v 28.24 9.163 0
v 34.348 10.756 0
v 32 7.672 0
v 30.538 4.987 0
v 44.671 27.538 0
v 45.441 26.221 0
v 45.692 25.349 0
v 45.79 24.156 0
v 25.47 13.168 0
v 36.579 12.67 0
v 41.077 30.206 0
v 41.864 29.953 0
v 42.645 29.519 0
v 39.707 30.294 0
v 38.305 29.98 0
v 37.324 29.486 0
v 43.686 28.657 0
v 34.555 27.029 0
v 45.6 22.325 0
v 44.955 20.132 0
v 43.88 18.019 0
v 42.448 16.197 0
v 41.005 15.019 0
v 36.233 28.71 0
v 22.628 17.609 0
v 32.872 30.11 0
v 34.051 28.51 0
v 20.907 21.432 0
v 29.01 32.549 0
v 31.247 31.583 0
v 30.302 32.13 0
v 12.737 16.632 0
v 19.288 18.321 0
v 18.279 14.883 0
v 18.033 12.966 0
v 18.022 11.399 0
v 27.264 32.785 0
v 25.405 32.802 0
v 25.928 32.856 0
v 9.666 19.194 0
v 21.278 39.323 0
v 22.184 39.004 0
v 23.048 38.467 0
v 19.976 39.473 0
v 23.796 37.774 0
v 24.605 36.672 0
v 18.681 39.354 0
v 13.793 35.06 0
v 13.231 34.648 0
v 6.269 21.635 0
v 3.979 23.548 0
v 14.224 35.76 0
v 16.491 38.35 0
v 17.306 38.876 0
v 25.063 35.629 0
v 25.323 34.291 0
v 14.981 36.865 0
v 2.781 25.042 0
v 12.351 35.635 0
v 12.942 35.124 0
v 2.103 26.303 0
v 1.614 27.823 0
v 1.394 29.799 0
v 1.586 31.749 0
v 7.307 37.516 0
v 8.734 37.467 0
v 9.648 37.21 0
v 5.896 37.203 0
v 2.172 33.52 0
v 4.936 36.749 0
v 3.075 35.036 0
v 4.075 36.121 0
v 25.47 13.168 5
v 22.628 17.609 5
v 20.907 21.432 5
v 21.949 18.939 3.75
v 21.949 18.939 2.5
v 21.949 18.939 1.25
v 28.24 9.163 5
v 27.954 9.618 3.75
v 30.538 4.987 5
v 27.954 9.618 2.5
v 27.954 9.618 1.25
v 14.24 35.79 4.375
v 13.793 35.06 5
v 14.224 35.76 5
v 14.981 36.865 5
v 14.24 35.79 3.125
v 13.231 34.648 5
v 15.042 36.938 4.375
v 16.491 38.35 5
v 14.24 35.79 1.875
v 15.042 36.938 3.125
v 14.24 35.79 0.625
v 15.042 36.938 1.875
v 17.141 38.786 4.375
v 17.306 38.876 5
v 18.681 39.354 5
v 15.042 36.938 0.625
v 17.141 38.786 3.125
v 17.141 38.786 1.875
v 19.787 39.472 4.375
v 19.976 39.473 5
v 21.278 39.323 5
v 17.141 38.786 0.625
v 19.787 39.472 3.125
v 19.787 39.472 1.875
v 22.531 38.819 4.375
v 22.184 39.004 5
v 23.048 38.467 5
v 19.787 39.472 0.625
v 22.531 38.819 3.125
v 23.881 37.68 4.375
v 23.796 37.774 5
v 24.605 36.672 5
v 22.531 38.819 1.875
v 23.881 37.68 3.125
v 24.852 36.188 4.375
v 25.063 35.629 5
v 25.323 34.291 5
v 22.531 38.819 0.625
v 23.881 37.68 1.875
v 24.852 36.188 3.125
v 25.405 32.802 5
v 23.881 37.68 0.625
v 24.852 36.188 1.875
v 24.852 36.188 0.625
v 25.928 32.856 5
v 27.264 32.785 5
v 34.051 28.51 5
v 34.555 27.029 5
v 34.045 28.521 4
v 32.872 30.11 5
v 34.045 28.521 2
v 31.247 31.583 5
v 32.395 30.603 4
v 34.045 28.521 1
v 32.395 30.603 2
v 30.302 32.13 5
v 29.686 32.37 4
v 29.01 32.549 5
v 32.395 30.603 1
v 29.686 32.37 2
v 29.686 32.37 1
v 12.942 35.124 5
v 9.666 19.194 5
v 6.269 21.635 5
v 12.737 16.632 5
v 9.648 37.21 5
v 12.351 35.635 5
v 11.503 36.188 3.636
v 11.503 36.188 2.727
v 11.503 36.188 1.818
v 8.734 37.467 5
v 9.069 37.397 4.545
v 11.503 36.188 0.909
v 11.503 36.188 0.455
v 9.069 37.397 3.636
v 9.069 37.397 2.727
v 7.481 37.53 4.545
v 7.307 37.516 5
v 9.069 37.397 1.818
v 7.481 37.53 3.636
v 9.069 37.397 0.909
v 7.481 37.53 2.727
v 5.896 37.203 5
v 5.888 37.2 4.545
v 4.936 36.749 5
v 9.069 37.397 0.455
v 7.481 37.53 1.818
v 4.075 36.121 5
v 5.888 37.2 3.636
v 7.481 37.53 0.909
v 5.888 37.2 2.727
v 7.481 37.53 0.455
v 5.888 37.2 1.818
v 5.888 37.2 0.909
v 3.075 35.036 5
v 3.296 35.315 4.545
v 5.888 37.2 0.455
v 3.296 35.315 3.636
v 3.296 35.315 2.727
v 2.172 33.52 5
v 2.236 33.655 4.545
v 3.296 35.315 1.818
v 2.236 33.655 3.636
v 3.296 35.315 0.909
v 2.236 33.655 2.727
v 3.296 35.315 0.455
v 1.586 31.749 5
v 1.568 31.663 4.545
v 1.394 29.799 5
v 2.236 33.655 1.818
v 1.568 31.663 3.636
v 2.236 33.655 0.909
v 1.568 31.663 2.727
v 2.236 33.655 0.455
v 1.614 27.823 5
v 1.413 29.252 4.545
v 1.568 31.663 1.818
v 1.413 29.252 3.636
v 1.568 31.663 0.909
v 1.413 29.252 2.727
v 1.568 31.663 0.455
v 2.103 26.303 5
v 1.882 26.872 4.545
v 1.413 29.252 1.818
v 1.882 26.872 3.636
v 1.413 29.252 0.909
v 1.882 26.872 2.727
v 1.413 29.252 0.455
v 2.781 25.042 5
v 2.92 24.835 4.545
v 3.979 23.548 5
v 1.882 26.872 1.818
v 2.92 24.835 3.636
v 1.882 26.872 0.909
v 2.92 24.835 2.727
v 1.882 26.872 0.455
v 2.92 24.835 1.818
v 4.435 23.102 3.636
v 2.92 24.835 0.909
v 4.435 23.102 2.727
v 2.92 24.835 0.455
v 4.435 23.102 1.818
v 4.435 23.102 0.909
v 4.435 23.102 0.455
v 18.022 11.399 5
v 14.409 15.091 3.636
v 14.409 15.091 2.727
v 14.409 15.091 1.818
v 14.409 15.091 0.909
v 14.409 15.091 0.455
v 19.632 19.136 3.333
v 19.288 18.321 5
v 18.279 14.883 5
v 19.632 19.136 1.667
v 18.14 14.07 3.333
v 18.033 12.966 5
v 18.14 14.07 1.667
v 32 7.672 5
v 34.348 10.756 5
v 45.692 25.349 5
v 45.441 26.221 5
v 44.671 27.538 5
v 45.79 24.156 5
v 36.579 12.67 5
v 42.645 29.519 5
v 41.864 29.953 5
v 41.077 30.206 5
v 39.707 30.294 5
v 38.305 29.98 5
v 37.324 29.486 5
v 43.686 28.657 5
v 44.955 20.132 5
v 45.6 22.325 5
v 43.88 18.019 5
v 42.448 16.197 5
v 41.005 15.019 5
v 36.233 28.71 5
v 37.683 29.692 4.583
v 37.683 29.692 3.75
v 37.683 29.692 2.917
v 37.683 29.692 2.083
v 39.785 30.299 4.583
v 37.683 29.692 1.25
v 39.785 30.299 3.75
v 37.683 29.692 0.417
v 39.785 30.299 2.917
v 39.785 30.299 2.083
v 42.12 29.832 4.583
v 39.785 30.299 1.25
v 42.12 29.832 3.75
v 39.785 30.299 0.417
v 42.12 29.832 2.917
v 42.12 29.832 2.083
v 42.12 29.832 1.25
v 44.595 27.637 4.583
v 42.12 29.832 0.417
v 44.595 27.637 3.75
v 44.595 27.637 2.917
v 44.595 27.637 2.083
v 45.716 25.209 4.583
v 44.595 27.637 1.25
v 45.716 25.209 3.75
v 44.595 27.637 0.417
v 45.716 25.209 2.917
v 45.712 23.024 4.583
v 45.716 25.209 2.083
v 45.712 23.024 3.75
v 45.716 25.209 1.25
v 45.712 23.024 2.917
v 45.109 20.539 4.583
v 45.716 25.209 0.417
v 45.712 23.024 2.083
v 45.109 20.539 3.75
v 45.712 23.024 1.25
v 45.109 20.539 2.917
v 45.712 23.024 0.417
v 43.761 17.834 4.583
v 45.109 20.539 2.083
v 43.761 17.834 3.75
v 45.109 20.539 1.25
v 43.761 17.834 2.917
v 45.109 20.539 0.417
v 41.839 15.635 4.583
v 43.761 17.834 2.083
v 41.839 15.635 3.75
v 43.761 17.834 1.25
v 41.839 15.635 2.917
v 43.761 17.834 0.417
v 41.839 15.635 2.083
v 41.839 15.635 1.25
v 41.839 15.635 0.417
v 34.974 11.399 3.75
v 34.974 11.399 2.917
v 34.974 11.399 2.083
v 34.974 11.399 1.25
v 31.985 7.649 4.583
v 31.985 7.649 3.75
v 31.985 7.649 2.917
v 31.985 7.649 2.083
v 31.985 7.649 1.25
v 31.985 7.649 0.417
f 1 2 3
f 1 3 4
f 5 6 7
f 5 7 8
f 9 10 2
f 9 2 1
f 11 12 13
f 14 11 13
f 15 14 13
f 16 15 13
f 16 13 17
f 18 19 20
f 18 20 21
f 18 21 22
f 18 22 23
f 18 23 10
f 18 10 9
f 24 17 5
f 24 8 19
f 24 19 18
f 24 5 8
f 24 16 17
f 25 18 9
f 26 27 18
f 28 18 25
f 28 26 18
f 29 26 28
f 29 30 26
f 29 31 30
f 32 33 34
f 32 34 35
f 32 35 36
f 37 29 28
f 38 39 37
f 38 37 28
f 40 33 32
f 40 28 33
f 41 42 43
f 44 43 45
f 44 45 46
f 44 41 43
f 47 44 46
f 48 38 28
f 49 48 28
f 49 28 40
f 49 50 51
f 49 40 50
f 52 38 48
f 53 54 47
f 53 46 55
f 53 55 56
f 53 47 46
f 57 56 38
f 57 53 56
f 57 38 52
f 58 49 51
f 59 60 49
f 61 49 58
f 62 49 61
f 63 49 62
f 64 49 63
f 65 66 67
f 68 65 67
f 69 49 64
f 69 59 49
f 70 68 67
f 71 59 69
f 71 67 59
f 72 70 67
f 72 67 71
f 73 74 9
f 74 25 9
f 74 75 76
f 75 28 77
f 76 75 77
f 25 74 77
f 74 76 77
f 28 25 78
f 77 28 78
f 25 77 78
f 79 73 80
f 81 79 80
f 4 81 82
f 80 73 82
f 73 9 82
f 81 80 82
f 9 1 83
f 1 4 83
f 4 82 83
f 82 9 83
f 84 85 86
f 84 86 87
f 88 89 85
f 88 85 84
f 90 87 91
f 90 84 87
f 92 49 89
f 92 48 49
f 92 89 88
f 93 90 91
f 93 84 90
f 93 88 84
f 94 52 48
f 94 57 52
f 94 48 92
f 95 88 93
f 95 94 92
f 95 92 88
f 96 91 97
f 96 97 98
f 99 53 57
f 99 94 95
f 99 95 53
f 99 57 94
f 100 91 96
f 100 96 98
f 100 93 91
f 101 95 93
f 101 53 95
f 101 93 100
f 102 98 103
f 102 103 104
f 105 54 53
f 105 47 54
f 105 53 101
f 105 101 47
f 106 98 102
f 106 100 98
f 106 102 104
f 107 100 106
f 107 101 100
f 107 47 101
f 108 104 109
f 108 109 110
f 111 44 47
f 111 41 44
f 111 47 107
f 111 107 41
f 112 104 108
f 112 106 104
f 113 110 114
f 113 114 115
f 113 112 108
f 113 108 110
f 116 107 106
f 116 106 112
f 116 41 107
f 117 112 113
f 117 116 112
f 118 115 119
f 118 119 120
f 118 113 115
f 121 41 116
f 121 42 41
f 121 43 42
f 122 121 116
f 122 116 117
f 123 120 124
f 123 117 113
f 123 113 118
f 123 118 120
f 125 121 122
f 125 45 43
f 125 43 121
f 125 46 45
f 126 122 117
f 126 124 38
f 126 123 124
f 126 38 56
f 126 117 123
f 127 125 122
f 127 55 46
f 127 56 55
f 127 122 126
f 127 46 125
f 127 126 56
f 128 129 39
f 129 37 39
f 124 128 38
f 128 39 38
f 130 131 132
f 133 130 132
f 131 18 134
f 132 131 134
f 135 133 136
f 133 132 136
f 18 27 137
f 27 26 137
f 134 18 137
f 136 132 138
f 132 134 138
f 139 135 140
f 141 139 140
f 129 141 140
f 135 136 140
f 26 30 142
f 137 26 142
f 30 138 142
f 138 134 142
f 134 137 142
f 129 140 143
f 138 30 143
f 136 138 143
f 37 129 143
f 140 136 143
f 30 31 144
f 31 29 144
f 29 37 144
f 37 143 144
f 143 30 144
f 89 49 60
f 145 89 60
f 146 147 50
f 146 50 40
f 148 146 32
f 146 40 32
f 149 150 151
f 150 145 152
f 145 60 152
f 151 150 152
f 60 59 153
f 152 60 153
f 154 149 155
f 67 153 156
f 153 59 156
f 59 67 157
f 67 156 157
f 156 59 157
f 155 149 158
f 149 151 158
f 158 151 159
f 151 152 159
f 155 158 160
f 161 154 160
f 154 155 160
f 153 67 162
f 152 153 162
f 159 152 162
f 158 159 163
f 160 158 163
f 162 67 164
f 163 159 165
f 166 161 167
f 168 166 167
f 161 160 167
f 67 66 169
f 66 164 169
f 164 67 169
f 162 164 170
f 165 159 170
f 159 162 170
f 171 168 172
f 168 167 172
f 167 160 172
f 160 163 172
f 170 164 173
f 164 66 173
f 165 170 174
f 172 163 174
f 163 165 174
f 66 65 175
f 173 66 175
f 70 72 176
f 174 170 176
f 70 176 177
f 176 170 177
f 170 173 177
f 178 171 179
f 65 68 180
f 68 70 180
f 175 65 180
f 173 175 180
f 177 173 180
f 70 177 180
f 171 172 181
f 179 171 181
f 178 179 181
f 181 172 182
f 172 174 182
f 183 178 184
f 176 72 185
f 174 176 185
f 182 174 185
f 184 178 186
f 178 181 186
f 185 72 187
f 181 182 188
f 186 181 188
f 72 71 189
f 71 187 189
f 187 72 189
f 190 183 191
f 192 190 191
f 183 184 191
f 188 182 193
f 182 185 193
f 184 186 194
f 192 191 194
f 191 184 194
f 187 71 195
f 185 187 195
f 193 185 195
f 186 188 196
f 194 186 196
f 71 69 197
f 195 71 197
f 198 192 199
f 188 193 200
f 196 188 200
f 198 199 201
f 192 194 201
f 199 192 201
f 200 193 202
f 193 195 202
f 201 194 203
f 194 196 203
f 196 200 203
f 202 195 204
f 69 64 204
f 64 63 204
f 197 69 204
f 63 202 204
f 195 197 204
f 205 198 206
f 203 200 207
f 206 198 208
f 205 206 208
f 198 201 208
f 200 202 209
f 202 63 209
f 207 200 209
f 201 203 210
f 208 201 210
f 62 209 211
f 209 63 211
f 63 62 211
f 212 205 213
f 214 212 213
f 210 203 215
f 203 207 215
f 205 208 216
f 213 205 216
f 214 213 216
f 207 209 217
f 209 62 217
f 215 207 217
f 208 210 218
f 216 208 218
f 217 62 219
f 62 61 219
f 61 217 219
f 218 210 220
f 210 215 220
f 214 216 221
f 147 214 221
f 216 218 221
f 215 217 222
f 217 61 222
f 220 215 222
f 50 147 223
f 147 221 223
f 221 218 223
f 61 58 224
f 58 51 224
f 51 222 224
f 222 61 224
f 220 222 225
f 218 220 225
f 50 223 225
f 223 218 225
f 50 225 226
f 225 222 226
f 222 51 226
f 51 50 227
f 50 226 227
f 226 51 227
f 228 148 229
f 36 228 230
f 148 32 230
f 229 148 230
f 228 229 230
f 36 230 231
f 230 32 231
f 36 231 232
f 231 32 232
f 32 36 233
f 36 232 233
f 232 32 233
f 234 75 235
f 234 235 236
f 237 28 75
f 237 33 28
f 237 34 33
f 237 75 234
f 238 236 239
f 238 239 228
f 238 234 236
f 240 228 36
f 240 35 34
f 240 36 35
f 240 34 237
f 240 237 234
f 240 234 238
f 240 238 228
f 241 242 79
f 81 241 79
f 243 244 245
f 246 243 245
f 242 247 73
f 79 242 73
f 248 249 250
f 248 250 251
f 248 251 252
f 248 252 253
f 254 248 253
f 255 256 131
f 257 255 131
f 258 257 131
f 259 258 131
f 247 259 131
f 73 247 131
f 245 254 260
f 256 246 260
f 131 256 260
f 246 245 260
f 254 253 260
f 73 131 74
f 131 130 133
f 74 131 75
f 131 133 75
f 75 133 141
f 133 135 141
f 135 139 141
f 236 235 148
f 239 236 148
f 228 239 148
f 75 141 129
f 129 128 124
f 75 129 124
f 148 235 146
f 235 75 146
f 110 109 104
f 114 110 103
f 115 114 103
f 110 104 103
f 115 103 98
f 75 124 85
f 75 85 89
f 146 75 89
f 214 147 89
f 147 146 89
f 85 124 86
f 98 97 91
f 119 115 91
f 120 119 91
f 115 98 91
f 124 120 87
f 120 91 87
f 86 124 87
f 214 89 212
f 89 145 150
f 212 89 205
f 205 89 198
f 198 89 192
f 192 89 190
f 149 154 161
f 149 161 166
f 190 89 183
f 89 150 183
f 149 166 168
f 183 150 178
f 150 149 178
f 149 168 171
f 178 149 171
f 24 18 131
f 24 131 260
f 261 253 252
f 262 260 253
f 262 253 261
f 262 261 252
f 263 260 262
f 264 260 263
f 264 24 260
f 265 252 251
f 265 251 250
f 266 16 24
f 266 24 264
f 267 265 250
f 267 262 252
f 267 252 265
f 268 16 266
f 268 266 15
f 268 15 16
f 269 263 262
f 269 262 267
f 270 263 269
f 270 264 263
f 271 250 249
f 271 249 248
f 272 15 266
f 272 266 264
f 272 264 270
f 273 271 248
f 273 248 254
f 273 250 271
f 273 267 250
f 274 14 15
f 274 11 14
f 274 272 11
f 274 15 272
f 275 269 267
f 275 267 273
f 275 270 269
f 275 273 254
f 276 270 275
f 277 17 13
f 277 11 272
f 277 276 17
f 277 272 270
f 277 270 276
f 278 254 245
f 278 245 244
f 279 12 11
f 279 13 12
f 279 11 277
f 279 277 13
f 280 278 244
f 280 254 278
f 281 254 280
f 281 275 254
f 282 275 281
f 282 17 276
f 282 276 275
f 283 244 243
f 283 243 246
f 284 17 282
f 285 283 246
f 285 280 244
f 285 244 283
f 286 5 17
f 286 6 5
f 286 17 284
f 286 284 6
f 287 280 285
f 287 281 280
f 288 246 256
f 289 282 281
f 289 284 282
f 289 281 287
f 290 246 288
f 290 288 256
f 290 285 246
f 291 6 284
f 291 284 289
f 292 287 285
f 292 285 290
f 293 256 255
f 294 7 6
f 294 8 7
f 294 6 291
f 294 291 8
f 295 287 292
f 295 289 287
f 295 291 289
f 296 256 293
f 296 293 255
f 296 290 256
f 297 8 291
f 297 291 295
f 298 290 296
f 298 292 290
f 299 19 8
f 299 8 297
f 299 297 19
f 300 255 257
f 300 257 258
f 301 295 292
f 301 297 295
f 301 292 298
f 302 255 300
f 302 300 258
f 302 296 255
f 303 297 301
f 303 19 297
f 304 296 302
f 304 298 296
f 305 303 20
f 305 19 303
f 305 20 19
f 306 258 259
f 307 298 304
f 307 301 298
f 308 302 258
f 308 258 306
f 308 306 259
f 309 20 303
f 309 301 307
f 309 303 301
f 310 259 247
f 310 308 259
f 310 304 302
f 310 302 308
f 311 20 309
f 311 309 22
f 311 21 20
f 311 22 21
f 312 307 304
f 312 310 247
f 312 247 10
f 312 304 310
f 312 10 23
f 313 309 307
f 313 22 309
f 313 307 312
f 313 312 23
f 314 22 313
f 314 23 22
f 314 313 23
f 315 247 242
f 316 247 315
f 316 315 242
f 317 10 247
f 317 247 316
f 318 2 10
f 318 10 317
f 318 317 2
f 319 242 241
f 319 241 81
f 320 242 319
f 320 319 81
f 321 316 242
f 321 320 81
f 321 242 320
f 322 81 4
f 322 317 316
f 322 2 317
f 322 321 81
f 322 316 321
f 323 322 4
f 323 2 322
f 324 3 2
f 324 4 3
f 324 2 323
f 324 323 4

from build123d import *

# Parameters (mm, degrees)
F1_DEPTH = 5


with BuildPart() as f1:
    # F0 (on Top) → F1 (new body)
    with BuildSketch(Plane.XY):
        with BuildLine():
            add(Edge.make_bspline(
                [(13.2313603535, 34.6477143466), (13.3860128067, 34.7708971807), (13.8439374067, 34.9725596836), (14.2425290678, 35.859788071), (15.0214905173, 37.0121026477), (17.0510127549, 39.0598870249), (19.7895274194, 39.648969919), (22.7106493723, 39.1553279299), (25.2588960312, 36.2283580781), (25.3659225333, 34.0957369092), (25.4052989185, 32.801989466)],
                knots=[0, 0, 0, 0, 0.0360498115, 0.0785490342, 0.13148727, 0.2062831808, 0.2802240924, 0.3553473431, 0.4391262067, 0.5219756188, 0.5219756188, 0.5219756188, 0.5219756188], degree=3))
            add(Edge.make_bspline(
                [(13.2313603535, 34.6477143466), (13.1402728599, 34.8189528746), (12.9175224351, 35.3065772667), (11.4084634827, 36.2346146059), (9.1412974835, 37.7260343927), (5.7295862641, 37.4813754341), (3.0524103893, 35.4571489186), (1.1615901244, 31.7120821081), (1.4625638549, 26.6840203078), (4.2914046083, 22.7835240851), (9.0346293269, 19.9055489899), (14.4673897508, 15.1783795437), (16.9038964696, 12.588386363), (18.0223938078, 11.3994209096)],
                knots=[0, 0, 0, 0, 0.0385138885, 0.1005209553, 0.1790644329, 0.2641100934, 0.3493936689, 0.445150389, 0.5495364555, 0.6511858115, 0.763762205, 0.8917299697, 1, 1, 1, 1], degree=3))
            add(Edge.make_bspline(
                [(20.9074965663, 21.4320479036), (20.4397909378, 20.7160128412), (19.1536009476, 18.4687205649), (17.9689395454, 14.1689344855), (18.0072581502, 12.1970093238), (18.0223938078, 11.3994209096)],
                knots=[0.7723386621, 0.7723386621, 0.7723386621, 0.7723386621, 0.8240831059, 0.9268721562, 1, 1, 1, 1], degree=3))
            add(Edge.make_bspline(
                [(25.4052989185, 32.801989466), (24.8507986109, 32.681806987), (22.8644241962, 31.9359697898), (20.3100342024, 30.2030018873), (19.713009884, 25.6821200924), (20.4971962661, 22.5993922561), (20.9074965663, 21.4320479036)],
                knots=[0.331582581, 0.331582581, 0.331582581, 0.331582581, 0.4019863947, 0.4781324085, 0.5772752719, 0.6416269142, 0.6416269142, 0.6416269142, 0.6416269142], degree=3))
        make_face()
        with BuildLine():
            add(Edge.make_bspline(
                [(34.5553867519, 27.0291864872), (34.4367400807, 27.5149384874), (34.1641372564, 28.631003235), (32.3969234221, 30.742971129), (29.9629211618, 32.6858599115), (26.2923004651, 32.8345684614), (25.7372004767, 32.8739258589), (25.4052989185, 32.801989466)],
                knots=[0, 0, 0, 0, 0.0556600677, 0.1278846806, 0.2075993831, 0.2894416929, 0.331582581, 0.331582581, 0.331582581, 0.331582581], degree=3))
            add(Edge.make_bspline(
                [(25.4052989185, 32.801989466), (25.4537991947, 31.2084681692), (25.5082397021, 27.3537455984), (22.7847524203, 24.0563409182), (21.3448835149, 22.1016665096), (20.9074965663, 21.4320479036)],
                knots=[0.5219756188, 0.5219756188, 0.5219756188, 0.5219756188, 0.6240220448, 0.7239485146, 0.7723386621, 0.7723386621, 0.7723386621, 0.7723386621], degree=3))
            add(Edge.make_bspline(
                [(20.9074965663, 21.4320479036), (21.2105185867, 20.5699207153), (22.3574274988, 17.8918362365), (24.6707903298, 14.1288456629), (28.0920668692, 9.7054547257), (29.7283607779, 6.5488655612), (30.5377673358, 4.9874321558)],
                knots=[0.6416269142, 0.6416269142, 0.6416269142, 0.6416269142, 0.6891529936, 0.7936878154, 0.897945941, 1, 1, 1, 1], degree=3))
            add(Edge.make_bspline(
                [(34.5553867519, 27.0291864872), (34.8203735388, 27.3505897537), (35.4573813145, 28.1232183902), (37.6385167055, 29.8654462886), (39.7677849185, 30.4488114234), (42.2795978468, 30.1070232175), (44.7532359489, 27.6792727197), (46.073530962, 25.2246332657), (45.4756259587, 20.2960969653), (42.2542319429, 15.2299568084), (37.8040590236, 13.503060576), (34.8575800501, 11.6236184128), (31.8782410275, 7.7182706429), (30.9492084702, 5.8256278562), (30.5377673358, 4.9874321558)],
                knots=[0, 0, 0, 0, 0.0539345536, 0.1296545026, 0.1973514734, 0.2679837797, 0.3512354169, 0.4260917368, 0.525421559, 0.636538444, 0.7342670699, 0.8200906036, 0.9203234316, 1, 1, 1, 1], degree=3))
        make_face()
        with BuildLine():
            add(Edge.make_bspline(
                [(25.4052989185, 32.801989466), (25.4537991947, 31.2084681692), (25.5082397021, 27.3537455984), (22.7847524203, 24.0563409182), (21.3448835149, 22.1016665096), (20.9074965663, 21.4320479036)],
                knots=[0.5219756188, 0.5219756188, 0.5219756188, 0.5219756188, 0.6240220448, 0.7239485146, 0.7723386621, 0.7723386621, 0.7723386621, 0.7723386621], degree=3))
            add(Edge.make_bspline(
                [(25.4052989185, 32.801989466), (24.8507986109, 32.681806987), (22.8644241962, 31.9359697898), (20.3100342024, 30.2030018873), (19.713009884, 25.6821200924), (20.4971962661, 22.5993922561), (20.9074965663, 21.4320479036)],
                knots=[0.331582581, 0.331582581, 0.331582581, 0.331582581, 0.4019863947, 0.4781324085, 0.5772752719, 0.6416269142, 0.6416269142, 0.6416269142, 0.6416269142], degree=3))
        make_face()
    extrude(amount=F1_DEPTH)


solid = f1.part
